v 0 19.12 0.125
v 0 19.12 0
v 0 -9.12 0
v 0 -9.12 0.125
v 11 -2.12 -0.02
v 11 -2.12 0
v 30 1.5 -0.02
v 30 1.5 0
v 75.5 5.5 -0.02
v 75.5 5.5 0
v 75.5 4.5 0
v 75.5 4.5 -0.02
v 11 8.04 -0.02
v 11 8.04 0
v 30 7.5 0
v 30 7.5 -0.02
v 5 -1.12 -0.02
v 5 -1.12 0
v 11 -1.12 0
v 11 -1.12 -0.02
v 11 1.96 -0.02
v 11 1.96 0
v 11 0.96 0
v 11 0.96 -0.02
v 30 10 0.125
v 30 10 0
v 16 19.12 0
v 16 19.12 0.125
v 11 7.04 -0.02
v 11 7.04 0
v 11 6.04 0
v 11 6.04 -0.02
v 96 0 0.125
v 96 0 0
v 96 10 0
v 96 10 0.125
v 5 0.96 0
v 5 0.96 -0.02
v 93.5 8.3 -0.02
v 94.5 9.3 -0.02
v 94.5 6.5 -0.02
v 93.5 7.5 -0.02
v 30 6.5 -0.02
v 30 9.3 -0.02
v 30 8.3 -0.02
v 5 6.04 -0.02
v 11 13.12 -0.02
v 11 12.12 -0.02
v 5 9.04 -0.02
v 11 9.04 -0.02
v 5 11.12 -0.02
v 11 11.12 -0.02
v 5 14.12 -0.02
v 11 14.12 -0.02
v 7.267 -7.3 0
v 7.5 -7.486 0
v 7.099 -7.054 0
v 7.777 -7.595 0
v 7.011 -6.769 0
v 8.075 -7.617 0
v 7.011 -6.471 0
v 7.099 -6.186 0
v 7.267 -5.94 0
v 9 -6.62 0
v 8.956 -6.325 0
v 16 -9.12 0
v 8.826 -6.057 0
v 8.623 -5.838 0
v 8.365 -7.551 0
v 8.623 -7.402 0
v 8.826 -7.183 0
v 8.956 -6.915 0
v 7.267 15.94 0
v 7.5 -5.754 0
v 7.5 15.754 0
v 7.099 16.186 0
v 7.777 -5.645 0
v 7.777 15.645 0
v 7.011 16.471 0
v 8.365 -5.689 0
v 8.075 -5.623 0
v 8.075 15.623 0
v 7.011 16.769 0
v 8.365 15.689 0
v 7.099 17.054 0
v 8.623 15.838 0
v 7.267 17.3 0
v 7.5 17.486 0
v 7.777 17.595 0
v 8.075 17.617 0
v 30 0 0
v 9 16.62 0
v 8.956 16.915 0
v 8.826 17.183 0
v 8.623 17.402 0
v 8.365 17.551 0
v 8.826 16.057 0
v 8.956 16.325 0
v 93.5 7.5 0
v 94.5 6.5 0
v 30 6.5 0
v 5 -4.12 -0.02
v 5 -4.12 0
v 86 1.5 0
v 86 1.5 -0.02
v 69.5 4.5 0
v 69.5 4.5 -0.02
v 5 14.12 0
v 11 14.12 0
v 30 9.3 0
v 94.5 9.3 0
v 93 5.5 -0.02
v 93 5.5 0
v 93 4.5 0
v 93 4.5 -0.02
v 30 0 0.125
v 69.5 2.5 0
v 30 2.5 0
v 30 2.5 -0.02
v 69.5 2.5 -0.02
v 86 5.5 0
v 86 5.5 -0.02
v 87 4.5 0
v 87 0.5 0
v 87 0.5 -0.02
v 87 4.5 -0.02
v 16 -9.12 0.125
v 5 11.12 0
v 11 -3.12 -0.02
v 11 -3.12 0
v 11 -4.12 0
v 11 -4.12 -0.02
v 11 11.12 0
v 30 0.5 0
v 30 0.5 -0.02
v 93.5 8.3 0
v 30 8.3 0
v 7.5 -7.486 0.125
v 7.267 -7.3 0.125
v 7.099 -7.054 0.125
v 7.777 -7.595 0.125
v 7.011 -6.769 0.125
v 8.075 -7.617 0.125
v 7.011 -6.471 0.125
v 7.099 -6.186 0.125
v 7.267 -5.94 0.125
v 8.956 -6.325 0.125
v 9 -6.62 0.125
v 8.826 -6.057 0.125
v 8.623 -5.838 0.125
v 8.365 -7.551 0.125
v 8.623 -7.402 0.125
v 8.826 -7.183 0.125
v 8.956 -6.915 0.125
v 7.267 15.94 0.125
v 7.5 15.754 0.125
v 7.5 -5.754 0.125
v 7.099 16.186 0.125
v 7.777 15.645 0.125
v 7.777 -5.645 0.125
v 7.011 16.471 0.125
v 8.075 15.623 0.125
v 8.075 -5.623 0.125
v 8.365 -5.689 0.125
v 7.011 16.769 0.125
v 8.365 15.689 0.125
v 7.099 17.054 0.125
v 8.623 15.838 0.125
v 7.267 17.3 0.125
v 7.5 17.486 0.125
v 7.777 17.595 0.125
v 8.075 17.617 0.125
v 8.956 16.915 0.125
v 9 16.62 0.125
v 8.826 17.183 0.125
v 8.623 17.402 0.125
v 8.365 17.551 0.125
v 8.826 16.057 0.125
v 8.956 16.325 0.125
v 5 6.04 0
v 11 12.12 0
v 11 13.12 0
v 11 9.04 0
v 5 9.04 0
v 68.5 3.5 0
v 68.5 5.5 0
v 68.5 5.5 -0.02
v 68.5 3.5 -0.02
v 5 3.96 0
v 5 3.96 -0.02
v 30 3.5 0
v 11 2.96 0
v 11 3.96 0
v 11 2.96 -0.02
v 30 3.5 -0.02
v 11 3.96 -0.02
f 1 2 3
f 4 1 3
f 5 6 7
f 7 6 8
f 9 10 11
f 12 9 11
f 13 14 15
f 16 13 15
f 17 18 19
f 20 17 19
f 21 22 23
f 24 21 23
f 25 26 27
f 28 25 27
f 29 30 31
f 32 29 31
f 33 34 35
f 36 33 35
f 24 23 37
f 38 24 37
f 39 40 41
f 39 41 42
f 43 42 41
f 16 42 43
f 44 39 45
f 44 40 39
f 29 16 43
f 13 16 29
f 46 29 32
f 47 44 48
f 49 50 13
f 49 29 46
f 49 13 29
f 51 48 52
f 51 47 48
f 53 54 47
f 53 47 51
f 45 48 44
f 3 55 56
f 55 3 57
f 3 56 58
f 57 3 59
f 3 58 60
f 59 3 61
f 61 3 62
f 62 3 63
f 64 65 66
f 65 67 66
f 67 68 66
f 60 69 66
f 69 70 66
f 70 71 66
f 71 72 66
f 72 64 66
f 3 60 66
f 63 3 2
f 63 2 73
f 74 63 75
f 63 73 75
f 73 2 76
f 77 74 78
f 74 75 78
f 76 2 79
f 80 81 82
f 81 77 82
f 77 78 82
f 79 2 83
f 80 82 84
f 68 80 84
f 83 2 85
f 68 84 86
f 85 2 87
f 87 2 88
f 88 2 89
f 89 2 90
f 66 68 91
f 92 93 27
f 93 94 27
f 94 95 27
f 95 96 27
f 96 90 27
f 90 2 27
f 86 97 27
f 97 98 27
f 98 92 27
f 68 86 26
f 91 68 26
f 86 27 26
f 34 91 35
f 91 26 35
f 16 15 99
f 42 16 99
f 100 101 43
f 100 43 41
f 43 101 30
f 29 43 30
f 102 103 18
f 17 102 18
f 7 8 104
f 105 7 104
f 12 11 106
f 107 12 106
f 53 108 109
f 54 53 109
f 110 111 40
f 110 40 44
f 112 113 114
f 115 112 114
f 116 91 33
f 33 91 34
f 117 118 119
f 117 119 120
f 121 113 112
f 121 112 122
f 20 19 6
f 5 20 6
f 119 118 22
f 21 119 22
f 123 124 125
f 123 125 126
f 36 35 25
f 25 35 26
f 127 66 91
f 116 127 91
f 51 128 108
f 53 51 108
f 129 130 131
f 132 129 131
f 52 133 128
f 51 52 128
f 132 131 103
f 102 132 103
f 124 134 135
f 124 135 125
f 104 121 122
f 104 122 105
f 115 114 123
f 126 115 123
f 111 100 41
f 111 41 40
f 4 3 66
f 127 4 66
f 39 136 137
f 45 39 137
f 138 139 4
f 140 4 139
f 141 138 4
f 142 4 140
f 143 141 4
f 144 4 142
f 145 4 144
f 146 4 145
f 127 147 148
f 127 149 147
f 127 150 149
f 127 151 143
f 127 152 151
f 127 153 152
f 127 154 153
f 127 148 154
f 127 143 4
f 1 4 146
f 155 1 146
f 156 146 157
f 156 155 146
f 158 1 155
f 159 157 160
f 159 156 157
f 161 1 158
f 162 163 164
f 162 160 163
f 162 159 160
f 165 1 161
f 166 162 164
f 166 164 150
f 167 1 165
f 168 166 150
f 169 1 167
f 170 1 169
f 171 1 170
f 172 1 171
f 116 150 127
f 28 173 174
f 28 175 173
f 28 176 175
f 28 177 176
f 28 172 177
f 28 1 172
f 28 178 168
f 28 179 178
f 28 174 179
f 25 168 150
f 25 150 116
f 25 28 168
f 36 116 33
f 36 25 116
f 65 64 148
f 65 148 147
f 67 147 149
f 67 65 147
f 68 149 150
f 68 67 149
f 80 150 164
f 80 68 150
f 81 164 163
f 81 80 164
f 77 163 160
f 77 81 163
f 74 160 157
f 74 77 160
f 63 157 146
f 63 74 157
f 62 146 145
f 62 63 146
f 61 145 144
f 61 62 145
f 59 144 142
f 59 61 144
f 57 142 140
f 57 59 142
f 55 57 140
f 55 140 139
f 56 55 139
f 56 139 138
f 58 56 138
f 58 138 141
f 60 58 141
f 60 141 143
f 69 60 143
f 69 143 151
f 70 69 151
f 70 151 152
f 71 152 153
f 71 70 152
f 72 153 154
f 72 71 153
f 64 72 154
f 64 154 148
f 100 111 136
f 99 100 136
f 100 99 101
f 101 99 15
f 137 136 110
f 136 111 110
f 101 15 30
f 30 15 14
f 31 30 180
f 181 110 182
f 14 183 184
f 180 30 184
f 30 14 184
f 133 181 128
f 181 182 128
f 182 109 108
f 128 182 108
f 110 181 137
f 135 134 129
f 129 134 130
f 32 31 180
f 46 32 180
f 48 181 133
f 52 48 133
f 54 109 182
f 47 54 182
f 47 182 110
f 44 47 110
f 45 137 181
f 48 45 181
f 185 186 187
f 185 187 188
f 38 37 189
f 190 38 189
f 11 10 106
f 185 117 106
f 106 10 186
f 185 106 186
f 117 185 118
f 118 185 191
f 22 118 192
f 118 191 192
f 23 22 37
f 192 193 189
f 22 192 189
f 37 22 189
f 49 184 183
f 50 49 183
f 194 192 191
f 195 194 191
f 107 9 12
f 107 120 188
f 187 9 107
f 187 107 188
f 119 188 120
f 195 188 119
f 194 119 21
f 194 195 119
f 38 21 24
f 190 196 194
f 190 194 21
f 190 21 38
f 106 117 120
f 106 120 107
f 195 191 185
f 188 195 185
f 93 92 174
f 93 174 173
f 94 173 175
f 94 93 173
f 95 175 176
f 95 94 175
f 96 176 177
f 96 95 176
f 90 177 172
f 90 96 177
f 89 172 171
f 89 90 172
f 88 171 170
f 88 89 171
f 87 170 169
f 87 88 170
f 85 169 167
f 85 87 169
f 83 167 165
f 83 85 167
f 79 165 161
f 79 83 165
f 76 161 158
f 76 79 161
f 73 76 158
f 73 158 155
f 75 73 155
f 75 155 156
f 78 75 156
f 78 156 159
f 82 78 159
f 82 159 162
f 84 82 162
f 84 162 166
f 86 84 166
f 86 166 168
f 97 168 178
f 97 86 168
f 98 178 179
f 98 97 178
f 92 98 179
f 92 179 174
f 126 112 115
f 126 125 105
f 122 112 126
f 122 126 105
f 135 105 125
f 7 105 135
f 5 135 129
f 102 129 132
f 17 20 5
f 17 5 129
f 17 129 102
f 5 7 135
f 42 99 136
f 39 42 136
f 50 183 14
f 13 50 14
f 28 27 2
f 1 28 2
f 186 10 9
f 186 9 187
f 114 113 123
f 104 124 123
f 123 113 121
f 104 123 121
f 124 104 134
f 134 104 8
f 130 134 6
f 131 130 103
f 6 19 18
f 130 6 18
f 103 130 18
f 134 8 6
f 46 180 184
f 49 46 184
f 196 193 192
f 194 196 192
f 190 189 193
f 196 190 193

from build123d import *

# Parameters (mm, degrees)
SKETCH1_R             = 1
BOSS_EXTRUDE1_DEPTH   = 0.125
BOSS_EXTRUDE2_DEPTH   = 0.02
BOSS_EXTRUDE2_2_DEPTH = 0.02
BOSS_EXTRUDE2_3_DEPTH = 0.02


with BuildPart() as part:
    # Sketch1 → Boss-Extrude1 (new body)
    with BuildSketch(Plane.XY):
        Polygon((0, -9.12), (16, -9.12), (30, 0), (96, 0), (96, 10), (30, 10), (16, 19.12), (0, 19.12), align=None)
        with Locations((8, -6.62)):
            Circle(SKETCH1_R, mode=Mode.SUBTRACT)
        with Locations((8, 16.62)):
            Circle(SKETCH1_R, mode=Mode.SUBTRACT)
    extrude(amount=BOSS_EXTRUDE1_DEPTH)


with BuildPart() as body_2:
    # Sketch2 → Boss-Extrude2 (new body)
    with BuildSketch(Plane.XY):
        Polygon((5, -4.12), (5, -1.12), (11, -1.12), (11, -2.12), (30, 1.5), (86, 1.5), (86, 4.5), (86, 5.5), (87, 5.5), (93, 5.5), (93, 4.5), (87, 4.5), (87, 1.5), (87, 0.5), (86, 0.5), (30, 0.5), (11, -3.12), (11, -4.12), align=None)
    extrude(amount=-BOSS_EXTRUDE2_DEPTH)


with BuildPart() as body_3:
    # Sketch2 → Boss-Extrude2 2 (new body)
    with BuildSketch(Plane.XY):
        Polygon((5, 0.96), (5, 3.96), (11, 3.96), (11, 2.96), (30, 3.5), (68.5, 3.5), (68.5, 4.5), (68.5, 5.5), (69.5, 5.5), (75.5, 5.5), (75.5, 4.5), (69.5, 4.5), (69.5, 3.5), (69.5, 2.5), (68.5, 2.5), (30, 2.5), (11, 1.96), (11, 0.96), align=None)
    extrude(amount=-BOSS_EXTRUDE2_2_DEPTH)


with BuildPart() as body_4:
    # Sketch2 → Boss-Extrude2 3 (new body)
    with BuildSketch(Plane.XY):
        Polygon((94.5, 6.5), (93.5, 6.5), (30, 6.5), (11, 7.04), (11, 6.04), (5, 6.04), (5, 9.04), (11, 9.04), (11, 8.04), (30, 7.5), (93.5, 7.5), (93.5, 8.3), (30, 8.3), (11, 12.12), (11, 11.12), (5, 11.12), (5, 14.12), (11, 14.12), (11, 13.12), (30, 9.3), (93.5, 9.3), (94.5, 9.3), (94.5, 8.3), (94.5, 7.5), align=None)
    extrude(amount=-BOSS_EXTRUDE2_3_DEPTH)


solid = Compound([part.part, body_2.part, body_3.part, body_4.part])
